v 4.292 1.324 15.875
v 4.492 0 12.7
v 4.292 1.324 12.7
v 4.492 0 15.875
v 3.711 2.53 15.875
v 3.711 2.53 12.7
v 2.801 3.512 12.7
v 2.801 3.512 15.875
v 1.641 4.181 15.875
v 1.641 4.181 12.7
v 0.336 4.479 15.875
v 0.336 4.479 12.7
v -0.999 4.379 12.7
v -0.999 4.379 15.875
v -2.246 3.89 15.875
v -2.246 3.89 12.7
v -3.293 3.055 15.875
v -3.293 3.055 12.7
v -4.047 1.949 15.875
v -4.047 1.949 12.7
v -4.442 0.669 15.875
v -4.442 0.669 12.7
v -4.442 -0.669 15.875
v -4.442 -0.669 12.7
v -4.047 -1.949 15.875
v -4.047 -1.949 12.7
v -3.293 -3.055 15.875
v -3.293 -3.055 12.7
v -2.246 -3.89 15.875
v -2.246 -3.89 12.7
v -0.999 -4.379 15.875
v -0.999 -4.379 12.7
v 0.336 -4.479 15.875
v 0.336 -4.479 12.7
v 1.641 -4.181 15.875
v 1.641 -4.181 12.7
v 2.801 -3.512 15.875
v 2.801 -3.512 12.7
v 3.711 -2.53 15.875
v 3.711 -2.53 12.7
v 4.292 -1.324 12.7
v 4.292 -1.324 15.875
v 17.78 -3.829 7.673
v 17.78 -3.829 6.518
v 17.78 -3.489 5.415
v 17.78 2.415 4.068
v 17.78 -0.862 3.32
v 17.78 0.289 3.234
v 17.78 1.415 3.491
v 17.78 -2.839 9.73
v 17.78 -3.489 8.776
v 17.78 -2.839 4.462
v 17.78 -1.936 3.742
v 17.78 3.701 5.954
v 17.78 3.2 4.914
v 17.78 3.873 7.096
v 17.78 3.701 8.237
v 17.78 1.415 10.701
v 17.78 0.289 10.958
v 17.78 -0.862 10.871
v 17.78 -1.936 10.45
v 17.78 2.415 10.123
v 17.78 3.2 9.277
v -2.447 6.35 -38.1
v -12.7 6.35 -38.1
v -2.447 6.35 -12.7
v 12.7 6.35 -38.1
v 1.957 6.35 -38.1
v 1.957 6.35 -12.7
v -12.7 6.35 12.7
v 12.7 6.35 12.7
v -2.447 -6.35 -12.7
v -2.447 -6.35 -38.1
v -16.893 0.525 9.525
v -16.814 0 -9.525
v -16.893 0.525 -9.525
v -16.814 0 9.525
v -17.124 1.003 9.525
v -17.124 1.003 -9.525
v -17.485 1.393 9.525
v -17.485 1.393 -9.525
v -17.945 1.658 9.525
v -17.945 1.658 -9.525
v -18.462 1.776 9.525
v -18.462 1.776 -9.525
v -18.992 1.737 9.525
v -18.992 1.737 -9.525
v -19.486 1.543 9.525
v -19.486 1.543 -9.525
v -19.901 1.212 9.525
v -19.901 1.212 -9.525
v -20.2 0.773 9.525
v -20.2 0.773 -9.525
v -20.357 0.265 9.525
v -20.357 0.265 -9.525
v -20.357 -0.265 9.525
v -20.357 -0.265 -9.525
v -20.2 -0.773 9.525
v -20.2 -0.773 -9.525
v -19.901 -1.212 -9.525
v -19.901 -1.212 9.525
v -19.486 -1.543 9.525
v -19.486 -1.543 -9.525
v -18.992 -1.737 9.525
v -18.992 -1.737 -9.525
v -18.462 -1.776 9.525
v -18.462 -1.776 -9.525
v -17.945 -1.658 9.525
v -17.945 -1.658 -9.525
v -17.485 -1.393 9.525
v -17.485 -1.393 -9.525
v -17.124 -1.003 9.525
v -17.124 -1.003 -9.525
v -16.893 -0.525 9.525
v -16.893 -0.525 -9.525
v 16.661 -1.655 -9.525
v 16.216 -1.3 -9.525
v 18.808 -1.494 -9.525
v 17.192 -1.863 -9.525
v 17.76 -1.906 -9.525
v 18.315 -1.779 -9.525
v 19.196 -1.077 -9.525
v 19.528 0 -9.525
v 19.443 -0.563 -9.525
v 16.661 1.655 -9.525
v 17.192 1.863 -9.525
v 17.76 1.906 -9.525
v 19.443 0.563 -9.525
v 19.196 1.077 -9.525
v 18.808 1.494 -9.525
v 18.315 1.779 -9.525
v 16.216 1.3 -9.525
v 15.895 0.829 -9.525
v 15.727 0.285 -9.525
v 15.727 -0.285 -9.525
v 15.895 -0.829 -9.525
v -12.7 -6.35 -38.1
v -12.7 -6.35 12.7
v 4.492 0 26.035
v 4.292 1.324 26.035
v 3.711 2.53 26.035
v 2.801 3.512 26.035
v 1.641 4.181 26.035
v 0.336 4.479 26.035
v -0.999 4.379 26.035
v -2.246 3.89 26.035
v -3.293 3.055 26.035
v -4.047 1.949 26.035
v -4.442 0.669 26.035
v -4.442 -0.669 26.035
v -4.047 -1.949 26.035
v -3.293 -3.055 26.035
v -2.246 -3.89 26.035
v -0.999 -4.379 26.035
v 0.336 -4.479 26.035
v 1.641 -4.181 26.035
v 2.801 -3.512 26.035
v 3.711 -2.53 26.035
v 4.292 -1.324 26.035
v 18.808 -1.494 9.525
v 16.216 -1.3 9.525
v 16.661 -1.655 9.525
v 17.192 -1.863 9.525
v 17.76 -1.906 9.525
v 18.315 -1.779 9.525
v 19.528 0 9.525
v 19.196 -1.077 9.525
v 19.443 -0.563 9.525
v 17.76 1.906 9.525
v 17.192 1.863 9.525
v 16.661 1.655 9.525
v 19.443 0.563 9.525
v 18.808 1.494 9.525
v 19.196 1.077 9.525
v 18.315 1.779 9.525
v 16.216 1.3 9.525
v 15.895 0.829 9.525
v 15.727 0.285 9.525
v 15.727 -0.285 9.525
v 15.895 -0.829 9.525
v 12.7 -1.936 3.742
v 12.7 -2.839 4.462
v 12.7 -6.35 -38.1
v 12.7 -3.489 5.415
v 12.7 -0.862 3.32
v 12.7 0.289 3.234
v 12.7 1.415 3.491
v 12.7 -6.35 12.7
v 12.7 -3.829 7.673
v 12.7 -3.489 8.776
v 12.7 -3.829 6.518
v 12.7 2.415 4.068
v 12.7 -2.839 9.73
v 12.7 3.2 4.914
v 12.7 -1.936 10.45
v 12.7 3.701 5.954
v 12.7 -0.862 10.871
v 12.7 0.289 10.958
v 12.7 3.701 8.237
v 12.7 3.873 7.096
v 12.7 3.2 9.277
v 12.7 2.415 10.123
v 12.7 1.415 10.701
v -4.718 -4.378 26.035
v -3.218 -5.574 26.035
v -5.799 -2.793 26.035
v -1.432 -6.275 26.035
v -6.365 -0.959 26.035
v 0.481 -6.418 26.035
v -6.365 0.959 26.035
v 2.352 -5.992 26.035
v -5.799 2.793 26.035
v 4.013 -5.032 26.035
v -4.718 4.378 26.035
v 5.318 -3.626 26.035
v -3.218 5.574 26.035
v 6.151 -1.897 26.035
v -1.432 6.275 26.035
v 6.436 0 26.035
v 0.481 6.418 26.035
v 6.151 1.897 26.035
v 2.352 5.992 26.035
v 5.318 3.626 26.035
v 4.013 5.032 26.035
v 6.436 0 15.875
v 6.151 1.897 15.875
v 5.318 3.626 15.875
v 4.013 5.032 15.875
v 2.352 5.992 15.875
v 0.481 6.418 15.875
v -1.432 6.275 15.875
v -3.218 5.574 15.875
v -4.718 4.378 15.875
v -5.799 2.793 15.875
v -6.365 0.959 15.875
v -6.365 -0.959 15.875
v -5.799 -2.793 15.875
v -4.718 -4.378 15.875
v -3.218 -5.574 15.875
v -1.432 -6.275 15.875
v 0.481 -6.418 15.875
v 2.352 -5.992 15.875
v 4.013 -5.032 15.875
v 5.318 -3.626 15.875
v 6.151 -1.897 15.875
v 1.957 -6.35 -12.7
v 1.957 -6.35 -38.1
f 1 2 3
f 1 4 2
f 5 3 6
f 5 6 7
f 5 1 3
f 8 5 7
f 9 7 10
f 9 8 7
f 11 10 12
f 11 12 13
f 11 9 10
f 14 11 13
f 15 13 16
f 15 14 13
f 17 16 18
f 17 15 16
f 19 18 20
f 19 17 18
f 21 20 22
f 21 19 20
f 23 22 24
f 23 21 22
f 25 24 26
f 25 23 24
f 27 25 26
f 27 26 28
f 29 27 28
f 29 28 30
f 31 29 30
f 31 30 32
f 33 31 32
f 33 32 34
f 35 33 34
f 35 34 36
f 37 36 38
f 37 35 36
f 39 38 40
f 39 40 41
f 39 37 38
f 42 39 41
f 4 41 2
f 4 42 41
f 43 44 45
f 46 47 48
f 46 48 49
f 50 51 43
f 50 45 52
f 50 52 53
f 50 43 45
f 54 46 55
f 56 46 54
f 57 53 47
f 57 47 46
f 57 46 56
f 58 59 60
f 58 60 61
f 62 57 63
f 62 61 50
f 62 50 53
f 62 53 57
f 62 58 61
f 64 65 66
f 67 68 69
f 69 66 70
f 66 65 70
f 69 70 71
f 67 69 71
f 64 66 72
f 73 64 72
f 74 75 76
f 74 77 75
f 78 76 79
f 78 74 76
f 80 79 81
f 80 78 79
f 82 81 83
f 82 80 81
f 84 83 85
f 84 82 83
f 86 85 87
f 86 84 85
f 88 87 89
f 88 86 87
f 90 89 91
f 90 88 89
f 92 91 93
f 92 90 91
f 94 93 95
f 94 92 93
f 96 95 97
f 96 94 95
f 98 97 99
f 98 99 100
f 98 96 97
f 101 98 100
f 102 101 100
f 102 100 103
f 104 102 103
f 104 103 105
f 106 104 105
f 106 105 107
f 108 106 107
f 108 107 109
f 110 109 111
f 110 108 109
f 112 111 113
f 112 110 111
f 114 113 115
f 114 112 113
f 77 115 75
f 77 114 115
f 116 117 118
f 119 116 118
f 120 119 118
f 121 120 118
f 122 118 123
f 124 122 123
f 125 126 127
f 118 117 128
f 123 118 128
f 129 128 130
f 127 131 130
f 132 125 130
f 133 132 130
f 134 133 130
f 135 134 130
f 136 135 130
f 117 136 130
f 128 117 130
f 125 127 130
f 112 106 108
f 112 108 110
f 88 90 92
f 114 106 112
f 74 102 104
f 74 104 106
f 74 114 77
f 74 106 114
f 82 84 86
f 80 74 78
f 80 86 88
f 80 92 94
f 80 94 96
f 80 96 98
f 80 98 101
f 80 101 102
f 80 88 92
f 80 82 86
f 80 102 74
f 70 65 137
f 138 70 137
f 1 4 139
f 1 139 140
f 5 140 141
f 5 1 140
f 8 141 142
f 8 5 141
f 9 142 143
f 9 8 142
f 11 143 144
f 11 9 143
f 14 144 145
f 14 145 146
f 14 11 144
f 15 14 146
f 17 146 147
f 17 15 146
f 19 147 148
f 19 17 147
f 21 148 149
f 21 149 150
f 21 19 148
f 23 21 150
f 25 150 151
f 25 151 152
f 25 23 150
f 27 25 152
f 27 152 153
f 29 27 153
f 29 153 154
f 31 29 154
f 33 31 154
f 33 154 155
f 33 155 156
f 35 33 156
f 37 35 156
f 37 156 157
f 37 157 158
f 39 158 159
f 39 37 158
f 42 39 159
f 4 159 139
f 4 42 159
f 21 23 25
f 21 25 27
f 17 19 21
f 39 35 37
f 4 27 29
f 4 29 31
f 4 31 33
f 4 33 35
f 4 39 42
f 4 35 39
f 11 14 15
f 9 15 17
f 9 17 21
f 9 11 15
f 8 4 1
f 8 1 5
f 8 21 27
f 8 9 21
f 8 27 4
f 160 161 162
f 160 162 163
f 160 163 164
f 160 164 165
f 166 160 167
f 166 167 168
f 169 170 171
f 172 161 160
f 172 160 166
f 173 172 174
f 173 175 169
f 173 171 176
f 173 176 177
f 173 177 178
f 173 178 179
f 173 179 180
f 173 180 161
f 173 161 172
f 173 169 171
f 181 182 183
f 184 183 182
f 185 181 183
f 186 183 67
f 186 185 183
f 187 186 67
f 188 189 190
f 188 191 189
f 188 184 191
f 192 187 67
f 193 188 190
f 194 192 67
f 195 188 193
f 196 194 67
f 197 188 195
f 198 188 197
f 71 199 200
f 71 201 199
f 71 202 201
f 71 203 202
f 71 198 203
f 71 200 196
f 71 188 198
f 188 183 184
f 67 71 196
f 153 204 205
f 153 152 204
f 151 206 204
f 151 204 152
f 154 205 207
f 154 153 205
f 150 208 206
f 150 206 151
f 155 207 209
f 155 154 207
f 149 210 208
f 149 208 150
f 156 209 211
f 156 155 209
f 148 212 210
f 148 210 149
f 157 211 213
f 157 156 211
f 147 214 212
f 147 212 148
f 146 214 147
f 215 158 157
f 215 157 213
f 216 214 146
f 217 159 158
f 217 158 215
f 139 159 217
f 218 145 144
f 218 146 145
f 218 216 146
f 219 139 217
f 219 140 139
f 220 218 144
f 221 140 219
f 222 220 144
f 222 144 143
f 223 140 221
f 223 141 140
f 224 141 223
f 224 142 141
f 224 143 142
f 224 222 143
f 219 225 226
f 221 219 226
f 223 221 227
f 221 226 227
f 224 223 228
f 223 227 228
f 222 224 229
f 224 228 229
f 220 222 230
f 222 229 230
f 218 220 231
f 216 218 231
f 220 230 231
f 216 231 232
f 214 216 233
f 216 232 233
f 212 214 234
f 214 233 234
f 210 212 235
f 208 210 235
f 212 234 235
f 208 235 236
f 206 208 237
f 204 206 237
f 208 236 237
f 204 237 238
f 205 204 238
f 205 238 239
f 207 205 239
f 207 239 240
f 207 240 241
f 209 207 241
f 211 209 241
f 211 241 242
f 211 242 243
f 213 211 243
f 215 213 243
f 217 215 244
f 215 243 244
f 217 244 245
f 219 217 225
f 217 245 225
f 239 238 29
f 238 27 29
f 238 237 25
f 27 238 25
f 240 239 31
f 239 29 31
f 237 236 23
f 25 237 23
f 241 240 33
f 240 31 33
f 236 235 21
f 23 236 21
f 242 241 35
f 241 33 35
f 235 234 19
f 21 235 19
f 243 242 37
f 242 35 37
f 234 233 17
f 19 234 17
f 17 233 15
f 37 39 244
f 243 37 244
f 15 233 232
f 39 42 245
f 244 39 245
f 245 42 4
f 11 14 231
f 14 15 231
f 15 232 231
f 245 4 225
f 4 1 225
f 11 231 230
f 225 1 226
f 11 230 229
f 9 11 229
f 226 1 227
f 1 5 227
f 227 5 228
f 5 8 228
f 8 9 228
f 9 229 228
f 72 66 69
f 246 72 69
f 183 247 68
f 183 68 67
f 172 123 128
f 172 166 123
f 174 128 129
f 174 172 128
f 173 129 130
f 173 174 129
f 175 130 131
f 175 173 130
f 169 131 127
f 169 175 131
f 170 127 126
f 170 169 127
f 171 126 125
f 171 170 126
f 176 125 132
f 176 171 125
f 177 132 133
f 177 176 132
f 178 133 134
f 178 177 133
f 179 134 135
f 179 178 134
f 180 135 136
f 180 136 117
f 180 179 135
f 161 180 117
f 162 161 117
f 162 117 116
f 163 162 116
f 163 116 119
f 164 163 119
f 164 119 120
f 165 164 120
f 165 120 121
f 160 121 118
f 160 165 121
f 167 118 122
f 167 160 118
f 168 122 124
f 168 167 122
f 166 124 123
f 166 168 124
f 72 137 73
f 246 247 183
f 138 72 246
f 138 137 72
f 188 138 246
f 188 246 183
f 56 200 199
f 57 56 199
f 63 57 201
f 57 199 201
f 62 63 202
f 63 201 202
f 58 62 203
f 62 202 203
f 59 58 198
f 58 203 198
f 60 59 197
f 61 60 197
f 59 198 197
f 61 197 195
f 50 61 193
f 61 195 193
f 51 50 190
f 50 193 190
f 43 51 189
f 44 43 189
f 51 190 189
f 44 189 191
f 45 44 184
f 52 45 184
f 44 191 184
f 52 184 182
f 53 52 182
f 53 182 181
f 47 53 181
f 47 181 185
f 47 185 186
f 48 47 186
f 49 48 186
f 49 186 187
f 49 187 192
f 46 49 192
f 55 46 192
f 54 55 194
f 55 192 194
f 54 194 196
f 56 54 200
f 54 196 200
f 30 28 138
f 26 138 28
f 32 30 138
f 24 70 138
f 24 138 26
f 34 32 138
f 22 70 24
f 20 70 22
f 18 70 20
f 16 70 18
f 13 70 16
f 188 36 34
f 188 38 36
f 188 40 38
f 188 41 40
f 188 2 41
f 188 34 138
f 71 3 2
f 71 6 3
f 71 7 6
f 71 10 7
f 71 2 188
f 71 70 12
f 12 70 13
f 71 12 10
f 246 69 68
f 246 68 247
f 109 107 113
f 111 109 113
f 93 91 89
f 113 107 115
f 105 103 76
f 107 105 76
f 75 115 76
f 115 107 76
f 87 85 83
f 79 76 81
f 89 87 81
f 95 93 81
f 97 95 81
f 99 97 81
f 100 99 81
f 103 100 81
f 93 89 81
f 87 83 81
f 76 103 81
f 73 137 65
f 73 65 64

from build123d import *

# Parameters (mm, degrees)
F0_W      = 12.7
F0_H      = 6.3499995352
F1_DEPTH  = 12.7
F2_R      = 4.4917075471
F3_DEPTH  = 3.175
F4_R      = 6.4364972291
F4_R_2    = 4.4917075471
F5_DEPTH  = 10.16
F8_R      = 3.8726977567
F9_DEPTH  = 5.08
F10_W     = 10.2532109383
F10_H     = 12.6999990704
F10_W_2   = 10.7425687972
F11_DEPTH = 25.4
F12_R     = 1.7812892701
F13_DEPTH = 9.525
F12_R_2   = 1.9110034549


# Not quite as in the source:
# - the program builds the solid bodies; features that only make, move or delete a surface that nothing else refers to are left out


with BuildPart() as f1:
    # F0 (on Top) → F1 (new body, symmetric)
    with BuildSketch(Plane.XY):
        with Locations((-6.35, -3.1749997676)):
            Rectangle(F0_W, F0_H)
        with Locations((6.35, -3.1749997676)):
            Rectangle(F0_W, F0_H)
        with Locations((-6.35, 3.1749997676)):
            Rectangle(F0_W, F0_H)
        with Locations((6.35, 3.1749997676)):
            Rectangle(F0_W, F0_H)
    extrude(amount=F1_DEPTH, both=True)

    # F2 (on face) → F3 (join, symmetric)
    with BuildSketch(Plane.XY.offset(12.7)):
        Circle(F2_R)
    extrude(amount=F3_DEPTH, both=True)

    # F8 (on face) → F9 (join)
    with BuildSketch(Plane.YZ.offset(12.7)):
        with Locations((0, 7.0956880227)):
            Circle(F8_R)
    extrude(amount=F9_DEPTH)

    # F10 (on face) → F11 (join)
    with BuildSketch(Plane(origin=(0, 0, -12.7), x_dir=(1, 0, 0), z_dir=(0, 0, -1))):
        with Locations((-7.5733945308, 0)):
            Rectangle(F10_W, F10_H)
        with Locations((7.3287156014, 0)):
            Rectangle(F10_W_2, F10_H)
    extrude(amount=F11_DEPTH)


with BuildPart() as f5:
    # F4 (on face) → F5 (new body)
    with BuildSketch(Plane.XY.offset(15.875)):
        Circle(F4_R)
        Circle(F4_R_2, mode=Mode.SUBTRACT)
    extrude(amount=F5_DEPTH)


with BuildPart() as f13:
    # F12 (on Top) → F13 (new body, symmetric)
    with BuildSketch(Plane.XY):
        with Locations((-18.5955967754, 0)):
            Circle(F12_R)
    extrude(amount=F13_DEPTH, both=True)


with BuildPart() as f13b:
    # F12 (on Top) → F13, piece 2 (new body, symmetric)
    with BuildSketch(Plane.XY):
        with Locations((17.616879195, 0)):
            Circle(F12_R_2)
    extrude(amount=F13_DEPTH, both=True)


solid = Compound([f1.part, f5.part, f13.part, f13b.part])
